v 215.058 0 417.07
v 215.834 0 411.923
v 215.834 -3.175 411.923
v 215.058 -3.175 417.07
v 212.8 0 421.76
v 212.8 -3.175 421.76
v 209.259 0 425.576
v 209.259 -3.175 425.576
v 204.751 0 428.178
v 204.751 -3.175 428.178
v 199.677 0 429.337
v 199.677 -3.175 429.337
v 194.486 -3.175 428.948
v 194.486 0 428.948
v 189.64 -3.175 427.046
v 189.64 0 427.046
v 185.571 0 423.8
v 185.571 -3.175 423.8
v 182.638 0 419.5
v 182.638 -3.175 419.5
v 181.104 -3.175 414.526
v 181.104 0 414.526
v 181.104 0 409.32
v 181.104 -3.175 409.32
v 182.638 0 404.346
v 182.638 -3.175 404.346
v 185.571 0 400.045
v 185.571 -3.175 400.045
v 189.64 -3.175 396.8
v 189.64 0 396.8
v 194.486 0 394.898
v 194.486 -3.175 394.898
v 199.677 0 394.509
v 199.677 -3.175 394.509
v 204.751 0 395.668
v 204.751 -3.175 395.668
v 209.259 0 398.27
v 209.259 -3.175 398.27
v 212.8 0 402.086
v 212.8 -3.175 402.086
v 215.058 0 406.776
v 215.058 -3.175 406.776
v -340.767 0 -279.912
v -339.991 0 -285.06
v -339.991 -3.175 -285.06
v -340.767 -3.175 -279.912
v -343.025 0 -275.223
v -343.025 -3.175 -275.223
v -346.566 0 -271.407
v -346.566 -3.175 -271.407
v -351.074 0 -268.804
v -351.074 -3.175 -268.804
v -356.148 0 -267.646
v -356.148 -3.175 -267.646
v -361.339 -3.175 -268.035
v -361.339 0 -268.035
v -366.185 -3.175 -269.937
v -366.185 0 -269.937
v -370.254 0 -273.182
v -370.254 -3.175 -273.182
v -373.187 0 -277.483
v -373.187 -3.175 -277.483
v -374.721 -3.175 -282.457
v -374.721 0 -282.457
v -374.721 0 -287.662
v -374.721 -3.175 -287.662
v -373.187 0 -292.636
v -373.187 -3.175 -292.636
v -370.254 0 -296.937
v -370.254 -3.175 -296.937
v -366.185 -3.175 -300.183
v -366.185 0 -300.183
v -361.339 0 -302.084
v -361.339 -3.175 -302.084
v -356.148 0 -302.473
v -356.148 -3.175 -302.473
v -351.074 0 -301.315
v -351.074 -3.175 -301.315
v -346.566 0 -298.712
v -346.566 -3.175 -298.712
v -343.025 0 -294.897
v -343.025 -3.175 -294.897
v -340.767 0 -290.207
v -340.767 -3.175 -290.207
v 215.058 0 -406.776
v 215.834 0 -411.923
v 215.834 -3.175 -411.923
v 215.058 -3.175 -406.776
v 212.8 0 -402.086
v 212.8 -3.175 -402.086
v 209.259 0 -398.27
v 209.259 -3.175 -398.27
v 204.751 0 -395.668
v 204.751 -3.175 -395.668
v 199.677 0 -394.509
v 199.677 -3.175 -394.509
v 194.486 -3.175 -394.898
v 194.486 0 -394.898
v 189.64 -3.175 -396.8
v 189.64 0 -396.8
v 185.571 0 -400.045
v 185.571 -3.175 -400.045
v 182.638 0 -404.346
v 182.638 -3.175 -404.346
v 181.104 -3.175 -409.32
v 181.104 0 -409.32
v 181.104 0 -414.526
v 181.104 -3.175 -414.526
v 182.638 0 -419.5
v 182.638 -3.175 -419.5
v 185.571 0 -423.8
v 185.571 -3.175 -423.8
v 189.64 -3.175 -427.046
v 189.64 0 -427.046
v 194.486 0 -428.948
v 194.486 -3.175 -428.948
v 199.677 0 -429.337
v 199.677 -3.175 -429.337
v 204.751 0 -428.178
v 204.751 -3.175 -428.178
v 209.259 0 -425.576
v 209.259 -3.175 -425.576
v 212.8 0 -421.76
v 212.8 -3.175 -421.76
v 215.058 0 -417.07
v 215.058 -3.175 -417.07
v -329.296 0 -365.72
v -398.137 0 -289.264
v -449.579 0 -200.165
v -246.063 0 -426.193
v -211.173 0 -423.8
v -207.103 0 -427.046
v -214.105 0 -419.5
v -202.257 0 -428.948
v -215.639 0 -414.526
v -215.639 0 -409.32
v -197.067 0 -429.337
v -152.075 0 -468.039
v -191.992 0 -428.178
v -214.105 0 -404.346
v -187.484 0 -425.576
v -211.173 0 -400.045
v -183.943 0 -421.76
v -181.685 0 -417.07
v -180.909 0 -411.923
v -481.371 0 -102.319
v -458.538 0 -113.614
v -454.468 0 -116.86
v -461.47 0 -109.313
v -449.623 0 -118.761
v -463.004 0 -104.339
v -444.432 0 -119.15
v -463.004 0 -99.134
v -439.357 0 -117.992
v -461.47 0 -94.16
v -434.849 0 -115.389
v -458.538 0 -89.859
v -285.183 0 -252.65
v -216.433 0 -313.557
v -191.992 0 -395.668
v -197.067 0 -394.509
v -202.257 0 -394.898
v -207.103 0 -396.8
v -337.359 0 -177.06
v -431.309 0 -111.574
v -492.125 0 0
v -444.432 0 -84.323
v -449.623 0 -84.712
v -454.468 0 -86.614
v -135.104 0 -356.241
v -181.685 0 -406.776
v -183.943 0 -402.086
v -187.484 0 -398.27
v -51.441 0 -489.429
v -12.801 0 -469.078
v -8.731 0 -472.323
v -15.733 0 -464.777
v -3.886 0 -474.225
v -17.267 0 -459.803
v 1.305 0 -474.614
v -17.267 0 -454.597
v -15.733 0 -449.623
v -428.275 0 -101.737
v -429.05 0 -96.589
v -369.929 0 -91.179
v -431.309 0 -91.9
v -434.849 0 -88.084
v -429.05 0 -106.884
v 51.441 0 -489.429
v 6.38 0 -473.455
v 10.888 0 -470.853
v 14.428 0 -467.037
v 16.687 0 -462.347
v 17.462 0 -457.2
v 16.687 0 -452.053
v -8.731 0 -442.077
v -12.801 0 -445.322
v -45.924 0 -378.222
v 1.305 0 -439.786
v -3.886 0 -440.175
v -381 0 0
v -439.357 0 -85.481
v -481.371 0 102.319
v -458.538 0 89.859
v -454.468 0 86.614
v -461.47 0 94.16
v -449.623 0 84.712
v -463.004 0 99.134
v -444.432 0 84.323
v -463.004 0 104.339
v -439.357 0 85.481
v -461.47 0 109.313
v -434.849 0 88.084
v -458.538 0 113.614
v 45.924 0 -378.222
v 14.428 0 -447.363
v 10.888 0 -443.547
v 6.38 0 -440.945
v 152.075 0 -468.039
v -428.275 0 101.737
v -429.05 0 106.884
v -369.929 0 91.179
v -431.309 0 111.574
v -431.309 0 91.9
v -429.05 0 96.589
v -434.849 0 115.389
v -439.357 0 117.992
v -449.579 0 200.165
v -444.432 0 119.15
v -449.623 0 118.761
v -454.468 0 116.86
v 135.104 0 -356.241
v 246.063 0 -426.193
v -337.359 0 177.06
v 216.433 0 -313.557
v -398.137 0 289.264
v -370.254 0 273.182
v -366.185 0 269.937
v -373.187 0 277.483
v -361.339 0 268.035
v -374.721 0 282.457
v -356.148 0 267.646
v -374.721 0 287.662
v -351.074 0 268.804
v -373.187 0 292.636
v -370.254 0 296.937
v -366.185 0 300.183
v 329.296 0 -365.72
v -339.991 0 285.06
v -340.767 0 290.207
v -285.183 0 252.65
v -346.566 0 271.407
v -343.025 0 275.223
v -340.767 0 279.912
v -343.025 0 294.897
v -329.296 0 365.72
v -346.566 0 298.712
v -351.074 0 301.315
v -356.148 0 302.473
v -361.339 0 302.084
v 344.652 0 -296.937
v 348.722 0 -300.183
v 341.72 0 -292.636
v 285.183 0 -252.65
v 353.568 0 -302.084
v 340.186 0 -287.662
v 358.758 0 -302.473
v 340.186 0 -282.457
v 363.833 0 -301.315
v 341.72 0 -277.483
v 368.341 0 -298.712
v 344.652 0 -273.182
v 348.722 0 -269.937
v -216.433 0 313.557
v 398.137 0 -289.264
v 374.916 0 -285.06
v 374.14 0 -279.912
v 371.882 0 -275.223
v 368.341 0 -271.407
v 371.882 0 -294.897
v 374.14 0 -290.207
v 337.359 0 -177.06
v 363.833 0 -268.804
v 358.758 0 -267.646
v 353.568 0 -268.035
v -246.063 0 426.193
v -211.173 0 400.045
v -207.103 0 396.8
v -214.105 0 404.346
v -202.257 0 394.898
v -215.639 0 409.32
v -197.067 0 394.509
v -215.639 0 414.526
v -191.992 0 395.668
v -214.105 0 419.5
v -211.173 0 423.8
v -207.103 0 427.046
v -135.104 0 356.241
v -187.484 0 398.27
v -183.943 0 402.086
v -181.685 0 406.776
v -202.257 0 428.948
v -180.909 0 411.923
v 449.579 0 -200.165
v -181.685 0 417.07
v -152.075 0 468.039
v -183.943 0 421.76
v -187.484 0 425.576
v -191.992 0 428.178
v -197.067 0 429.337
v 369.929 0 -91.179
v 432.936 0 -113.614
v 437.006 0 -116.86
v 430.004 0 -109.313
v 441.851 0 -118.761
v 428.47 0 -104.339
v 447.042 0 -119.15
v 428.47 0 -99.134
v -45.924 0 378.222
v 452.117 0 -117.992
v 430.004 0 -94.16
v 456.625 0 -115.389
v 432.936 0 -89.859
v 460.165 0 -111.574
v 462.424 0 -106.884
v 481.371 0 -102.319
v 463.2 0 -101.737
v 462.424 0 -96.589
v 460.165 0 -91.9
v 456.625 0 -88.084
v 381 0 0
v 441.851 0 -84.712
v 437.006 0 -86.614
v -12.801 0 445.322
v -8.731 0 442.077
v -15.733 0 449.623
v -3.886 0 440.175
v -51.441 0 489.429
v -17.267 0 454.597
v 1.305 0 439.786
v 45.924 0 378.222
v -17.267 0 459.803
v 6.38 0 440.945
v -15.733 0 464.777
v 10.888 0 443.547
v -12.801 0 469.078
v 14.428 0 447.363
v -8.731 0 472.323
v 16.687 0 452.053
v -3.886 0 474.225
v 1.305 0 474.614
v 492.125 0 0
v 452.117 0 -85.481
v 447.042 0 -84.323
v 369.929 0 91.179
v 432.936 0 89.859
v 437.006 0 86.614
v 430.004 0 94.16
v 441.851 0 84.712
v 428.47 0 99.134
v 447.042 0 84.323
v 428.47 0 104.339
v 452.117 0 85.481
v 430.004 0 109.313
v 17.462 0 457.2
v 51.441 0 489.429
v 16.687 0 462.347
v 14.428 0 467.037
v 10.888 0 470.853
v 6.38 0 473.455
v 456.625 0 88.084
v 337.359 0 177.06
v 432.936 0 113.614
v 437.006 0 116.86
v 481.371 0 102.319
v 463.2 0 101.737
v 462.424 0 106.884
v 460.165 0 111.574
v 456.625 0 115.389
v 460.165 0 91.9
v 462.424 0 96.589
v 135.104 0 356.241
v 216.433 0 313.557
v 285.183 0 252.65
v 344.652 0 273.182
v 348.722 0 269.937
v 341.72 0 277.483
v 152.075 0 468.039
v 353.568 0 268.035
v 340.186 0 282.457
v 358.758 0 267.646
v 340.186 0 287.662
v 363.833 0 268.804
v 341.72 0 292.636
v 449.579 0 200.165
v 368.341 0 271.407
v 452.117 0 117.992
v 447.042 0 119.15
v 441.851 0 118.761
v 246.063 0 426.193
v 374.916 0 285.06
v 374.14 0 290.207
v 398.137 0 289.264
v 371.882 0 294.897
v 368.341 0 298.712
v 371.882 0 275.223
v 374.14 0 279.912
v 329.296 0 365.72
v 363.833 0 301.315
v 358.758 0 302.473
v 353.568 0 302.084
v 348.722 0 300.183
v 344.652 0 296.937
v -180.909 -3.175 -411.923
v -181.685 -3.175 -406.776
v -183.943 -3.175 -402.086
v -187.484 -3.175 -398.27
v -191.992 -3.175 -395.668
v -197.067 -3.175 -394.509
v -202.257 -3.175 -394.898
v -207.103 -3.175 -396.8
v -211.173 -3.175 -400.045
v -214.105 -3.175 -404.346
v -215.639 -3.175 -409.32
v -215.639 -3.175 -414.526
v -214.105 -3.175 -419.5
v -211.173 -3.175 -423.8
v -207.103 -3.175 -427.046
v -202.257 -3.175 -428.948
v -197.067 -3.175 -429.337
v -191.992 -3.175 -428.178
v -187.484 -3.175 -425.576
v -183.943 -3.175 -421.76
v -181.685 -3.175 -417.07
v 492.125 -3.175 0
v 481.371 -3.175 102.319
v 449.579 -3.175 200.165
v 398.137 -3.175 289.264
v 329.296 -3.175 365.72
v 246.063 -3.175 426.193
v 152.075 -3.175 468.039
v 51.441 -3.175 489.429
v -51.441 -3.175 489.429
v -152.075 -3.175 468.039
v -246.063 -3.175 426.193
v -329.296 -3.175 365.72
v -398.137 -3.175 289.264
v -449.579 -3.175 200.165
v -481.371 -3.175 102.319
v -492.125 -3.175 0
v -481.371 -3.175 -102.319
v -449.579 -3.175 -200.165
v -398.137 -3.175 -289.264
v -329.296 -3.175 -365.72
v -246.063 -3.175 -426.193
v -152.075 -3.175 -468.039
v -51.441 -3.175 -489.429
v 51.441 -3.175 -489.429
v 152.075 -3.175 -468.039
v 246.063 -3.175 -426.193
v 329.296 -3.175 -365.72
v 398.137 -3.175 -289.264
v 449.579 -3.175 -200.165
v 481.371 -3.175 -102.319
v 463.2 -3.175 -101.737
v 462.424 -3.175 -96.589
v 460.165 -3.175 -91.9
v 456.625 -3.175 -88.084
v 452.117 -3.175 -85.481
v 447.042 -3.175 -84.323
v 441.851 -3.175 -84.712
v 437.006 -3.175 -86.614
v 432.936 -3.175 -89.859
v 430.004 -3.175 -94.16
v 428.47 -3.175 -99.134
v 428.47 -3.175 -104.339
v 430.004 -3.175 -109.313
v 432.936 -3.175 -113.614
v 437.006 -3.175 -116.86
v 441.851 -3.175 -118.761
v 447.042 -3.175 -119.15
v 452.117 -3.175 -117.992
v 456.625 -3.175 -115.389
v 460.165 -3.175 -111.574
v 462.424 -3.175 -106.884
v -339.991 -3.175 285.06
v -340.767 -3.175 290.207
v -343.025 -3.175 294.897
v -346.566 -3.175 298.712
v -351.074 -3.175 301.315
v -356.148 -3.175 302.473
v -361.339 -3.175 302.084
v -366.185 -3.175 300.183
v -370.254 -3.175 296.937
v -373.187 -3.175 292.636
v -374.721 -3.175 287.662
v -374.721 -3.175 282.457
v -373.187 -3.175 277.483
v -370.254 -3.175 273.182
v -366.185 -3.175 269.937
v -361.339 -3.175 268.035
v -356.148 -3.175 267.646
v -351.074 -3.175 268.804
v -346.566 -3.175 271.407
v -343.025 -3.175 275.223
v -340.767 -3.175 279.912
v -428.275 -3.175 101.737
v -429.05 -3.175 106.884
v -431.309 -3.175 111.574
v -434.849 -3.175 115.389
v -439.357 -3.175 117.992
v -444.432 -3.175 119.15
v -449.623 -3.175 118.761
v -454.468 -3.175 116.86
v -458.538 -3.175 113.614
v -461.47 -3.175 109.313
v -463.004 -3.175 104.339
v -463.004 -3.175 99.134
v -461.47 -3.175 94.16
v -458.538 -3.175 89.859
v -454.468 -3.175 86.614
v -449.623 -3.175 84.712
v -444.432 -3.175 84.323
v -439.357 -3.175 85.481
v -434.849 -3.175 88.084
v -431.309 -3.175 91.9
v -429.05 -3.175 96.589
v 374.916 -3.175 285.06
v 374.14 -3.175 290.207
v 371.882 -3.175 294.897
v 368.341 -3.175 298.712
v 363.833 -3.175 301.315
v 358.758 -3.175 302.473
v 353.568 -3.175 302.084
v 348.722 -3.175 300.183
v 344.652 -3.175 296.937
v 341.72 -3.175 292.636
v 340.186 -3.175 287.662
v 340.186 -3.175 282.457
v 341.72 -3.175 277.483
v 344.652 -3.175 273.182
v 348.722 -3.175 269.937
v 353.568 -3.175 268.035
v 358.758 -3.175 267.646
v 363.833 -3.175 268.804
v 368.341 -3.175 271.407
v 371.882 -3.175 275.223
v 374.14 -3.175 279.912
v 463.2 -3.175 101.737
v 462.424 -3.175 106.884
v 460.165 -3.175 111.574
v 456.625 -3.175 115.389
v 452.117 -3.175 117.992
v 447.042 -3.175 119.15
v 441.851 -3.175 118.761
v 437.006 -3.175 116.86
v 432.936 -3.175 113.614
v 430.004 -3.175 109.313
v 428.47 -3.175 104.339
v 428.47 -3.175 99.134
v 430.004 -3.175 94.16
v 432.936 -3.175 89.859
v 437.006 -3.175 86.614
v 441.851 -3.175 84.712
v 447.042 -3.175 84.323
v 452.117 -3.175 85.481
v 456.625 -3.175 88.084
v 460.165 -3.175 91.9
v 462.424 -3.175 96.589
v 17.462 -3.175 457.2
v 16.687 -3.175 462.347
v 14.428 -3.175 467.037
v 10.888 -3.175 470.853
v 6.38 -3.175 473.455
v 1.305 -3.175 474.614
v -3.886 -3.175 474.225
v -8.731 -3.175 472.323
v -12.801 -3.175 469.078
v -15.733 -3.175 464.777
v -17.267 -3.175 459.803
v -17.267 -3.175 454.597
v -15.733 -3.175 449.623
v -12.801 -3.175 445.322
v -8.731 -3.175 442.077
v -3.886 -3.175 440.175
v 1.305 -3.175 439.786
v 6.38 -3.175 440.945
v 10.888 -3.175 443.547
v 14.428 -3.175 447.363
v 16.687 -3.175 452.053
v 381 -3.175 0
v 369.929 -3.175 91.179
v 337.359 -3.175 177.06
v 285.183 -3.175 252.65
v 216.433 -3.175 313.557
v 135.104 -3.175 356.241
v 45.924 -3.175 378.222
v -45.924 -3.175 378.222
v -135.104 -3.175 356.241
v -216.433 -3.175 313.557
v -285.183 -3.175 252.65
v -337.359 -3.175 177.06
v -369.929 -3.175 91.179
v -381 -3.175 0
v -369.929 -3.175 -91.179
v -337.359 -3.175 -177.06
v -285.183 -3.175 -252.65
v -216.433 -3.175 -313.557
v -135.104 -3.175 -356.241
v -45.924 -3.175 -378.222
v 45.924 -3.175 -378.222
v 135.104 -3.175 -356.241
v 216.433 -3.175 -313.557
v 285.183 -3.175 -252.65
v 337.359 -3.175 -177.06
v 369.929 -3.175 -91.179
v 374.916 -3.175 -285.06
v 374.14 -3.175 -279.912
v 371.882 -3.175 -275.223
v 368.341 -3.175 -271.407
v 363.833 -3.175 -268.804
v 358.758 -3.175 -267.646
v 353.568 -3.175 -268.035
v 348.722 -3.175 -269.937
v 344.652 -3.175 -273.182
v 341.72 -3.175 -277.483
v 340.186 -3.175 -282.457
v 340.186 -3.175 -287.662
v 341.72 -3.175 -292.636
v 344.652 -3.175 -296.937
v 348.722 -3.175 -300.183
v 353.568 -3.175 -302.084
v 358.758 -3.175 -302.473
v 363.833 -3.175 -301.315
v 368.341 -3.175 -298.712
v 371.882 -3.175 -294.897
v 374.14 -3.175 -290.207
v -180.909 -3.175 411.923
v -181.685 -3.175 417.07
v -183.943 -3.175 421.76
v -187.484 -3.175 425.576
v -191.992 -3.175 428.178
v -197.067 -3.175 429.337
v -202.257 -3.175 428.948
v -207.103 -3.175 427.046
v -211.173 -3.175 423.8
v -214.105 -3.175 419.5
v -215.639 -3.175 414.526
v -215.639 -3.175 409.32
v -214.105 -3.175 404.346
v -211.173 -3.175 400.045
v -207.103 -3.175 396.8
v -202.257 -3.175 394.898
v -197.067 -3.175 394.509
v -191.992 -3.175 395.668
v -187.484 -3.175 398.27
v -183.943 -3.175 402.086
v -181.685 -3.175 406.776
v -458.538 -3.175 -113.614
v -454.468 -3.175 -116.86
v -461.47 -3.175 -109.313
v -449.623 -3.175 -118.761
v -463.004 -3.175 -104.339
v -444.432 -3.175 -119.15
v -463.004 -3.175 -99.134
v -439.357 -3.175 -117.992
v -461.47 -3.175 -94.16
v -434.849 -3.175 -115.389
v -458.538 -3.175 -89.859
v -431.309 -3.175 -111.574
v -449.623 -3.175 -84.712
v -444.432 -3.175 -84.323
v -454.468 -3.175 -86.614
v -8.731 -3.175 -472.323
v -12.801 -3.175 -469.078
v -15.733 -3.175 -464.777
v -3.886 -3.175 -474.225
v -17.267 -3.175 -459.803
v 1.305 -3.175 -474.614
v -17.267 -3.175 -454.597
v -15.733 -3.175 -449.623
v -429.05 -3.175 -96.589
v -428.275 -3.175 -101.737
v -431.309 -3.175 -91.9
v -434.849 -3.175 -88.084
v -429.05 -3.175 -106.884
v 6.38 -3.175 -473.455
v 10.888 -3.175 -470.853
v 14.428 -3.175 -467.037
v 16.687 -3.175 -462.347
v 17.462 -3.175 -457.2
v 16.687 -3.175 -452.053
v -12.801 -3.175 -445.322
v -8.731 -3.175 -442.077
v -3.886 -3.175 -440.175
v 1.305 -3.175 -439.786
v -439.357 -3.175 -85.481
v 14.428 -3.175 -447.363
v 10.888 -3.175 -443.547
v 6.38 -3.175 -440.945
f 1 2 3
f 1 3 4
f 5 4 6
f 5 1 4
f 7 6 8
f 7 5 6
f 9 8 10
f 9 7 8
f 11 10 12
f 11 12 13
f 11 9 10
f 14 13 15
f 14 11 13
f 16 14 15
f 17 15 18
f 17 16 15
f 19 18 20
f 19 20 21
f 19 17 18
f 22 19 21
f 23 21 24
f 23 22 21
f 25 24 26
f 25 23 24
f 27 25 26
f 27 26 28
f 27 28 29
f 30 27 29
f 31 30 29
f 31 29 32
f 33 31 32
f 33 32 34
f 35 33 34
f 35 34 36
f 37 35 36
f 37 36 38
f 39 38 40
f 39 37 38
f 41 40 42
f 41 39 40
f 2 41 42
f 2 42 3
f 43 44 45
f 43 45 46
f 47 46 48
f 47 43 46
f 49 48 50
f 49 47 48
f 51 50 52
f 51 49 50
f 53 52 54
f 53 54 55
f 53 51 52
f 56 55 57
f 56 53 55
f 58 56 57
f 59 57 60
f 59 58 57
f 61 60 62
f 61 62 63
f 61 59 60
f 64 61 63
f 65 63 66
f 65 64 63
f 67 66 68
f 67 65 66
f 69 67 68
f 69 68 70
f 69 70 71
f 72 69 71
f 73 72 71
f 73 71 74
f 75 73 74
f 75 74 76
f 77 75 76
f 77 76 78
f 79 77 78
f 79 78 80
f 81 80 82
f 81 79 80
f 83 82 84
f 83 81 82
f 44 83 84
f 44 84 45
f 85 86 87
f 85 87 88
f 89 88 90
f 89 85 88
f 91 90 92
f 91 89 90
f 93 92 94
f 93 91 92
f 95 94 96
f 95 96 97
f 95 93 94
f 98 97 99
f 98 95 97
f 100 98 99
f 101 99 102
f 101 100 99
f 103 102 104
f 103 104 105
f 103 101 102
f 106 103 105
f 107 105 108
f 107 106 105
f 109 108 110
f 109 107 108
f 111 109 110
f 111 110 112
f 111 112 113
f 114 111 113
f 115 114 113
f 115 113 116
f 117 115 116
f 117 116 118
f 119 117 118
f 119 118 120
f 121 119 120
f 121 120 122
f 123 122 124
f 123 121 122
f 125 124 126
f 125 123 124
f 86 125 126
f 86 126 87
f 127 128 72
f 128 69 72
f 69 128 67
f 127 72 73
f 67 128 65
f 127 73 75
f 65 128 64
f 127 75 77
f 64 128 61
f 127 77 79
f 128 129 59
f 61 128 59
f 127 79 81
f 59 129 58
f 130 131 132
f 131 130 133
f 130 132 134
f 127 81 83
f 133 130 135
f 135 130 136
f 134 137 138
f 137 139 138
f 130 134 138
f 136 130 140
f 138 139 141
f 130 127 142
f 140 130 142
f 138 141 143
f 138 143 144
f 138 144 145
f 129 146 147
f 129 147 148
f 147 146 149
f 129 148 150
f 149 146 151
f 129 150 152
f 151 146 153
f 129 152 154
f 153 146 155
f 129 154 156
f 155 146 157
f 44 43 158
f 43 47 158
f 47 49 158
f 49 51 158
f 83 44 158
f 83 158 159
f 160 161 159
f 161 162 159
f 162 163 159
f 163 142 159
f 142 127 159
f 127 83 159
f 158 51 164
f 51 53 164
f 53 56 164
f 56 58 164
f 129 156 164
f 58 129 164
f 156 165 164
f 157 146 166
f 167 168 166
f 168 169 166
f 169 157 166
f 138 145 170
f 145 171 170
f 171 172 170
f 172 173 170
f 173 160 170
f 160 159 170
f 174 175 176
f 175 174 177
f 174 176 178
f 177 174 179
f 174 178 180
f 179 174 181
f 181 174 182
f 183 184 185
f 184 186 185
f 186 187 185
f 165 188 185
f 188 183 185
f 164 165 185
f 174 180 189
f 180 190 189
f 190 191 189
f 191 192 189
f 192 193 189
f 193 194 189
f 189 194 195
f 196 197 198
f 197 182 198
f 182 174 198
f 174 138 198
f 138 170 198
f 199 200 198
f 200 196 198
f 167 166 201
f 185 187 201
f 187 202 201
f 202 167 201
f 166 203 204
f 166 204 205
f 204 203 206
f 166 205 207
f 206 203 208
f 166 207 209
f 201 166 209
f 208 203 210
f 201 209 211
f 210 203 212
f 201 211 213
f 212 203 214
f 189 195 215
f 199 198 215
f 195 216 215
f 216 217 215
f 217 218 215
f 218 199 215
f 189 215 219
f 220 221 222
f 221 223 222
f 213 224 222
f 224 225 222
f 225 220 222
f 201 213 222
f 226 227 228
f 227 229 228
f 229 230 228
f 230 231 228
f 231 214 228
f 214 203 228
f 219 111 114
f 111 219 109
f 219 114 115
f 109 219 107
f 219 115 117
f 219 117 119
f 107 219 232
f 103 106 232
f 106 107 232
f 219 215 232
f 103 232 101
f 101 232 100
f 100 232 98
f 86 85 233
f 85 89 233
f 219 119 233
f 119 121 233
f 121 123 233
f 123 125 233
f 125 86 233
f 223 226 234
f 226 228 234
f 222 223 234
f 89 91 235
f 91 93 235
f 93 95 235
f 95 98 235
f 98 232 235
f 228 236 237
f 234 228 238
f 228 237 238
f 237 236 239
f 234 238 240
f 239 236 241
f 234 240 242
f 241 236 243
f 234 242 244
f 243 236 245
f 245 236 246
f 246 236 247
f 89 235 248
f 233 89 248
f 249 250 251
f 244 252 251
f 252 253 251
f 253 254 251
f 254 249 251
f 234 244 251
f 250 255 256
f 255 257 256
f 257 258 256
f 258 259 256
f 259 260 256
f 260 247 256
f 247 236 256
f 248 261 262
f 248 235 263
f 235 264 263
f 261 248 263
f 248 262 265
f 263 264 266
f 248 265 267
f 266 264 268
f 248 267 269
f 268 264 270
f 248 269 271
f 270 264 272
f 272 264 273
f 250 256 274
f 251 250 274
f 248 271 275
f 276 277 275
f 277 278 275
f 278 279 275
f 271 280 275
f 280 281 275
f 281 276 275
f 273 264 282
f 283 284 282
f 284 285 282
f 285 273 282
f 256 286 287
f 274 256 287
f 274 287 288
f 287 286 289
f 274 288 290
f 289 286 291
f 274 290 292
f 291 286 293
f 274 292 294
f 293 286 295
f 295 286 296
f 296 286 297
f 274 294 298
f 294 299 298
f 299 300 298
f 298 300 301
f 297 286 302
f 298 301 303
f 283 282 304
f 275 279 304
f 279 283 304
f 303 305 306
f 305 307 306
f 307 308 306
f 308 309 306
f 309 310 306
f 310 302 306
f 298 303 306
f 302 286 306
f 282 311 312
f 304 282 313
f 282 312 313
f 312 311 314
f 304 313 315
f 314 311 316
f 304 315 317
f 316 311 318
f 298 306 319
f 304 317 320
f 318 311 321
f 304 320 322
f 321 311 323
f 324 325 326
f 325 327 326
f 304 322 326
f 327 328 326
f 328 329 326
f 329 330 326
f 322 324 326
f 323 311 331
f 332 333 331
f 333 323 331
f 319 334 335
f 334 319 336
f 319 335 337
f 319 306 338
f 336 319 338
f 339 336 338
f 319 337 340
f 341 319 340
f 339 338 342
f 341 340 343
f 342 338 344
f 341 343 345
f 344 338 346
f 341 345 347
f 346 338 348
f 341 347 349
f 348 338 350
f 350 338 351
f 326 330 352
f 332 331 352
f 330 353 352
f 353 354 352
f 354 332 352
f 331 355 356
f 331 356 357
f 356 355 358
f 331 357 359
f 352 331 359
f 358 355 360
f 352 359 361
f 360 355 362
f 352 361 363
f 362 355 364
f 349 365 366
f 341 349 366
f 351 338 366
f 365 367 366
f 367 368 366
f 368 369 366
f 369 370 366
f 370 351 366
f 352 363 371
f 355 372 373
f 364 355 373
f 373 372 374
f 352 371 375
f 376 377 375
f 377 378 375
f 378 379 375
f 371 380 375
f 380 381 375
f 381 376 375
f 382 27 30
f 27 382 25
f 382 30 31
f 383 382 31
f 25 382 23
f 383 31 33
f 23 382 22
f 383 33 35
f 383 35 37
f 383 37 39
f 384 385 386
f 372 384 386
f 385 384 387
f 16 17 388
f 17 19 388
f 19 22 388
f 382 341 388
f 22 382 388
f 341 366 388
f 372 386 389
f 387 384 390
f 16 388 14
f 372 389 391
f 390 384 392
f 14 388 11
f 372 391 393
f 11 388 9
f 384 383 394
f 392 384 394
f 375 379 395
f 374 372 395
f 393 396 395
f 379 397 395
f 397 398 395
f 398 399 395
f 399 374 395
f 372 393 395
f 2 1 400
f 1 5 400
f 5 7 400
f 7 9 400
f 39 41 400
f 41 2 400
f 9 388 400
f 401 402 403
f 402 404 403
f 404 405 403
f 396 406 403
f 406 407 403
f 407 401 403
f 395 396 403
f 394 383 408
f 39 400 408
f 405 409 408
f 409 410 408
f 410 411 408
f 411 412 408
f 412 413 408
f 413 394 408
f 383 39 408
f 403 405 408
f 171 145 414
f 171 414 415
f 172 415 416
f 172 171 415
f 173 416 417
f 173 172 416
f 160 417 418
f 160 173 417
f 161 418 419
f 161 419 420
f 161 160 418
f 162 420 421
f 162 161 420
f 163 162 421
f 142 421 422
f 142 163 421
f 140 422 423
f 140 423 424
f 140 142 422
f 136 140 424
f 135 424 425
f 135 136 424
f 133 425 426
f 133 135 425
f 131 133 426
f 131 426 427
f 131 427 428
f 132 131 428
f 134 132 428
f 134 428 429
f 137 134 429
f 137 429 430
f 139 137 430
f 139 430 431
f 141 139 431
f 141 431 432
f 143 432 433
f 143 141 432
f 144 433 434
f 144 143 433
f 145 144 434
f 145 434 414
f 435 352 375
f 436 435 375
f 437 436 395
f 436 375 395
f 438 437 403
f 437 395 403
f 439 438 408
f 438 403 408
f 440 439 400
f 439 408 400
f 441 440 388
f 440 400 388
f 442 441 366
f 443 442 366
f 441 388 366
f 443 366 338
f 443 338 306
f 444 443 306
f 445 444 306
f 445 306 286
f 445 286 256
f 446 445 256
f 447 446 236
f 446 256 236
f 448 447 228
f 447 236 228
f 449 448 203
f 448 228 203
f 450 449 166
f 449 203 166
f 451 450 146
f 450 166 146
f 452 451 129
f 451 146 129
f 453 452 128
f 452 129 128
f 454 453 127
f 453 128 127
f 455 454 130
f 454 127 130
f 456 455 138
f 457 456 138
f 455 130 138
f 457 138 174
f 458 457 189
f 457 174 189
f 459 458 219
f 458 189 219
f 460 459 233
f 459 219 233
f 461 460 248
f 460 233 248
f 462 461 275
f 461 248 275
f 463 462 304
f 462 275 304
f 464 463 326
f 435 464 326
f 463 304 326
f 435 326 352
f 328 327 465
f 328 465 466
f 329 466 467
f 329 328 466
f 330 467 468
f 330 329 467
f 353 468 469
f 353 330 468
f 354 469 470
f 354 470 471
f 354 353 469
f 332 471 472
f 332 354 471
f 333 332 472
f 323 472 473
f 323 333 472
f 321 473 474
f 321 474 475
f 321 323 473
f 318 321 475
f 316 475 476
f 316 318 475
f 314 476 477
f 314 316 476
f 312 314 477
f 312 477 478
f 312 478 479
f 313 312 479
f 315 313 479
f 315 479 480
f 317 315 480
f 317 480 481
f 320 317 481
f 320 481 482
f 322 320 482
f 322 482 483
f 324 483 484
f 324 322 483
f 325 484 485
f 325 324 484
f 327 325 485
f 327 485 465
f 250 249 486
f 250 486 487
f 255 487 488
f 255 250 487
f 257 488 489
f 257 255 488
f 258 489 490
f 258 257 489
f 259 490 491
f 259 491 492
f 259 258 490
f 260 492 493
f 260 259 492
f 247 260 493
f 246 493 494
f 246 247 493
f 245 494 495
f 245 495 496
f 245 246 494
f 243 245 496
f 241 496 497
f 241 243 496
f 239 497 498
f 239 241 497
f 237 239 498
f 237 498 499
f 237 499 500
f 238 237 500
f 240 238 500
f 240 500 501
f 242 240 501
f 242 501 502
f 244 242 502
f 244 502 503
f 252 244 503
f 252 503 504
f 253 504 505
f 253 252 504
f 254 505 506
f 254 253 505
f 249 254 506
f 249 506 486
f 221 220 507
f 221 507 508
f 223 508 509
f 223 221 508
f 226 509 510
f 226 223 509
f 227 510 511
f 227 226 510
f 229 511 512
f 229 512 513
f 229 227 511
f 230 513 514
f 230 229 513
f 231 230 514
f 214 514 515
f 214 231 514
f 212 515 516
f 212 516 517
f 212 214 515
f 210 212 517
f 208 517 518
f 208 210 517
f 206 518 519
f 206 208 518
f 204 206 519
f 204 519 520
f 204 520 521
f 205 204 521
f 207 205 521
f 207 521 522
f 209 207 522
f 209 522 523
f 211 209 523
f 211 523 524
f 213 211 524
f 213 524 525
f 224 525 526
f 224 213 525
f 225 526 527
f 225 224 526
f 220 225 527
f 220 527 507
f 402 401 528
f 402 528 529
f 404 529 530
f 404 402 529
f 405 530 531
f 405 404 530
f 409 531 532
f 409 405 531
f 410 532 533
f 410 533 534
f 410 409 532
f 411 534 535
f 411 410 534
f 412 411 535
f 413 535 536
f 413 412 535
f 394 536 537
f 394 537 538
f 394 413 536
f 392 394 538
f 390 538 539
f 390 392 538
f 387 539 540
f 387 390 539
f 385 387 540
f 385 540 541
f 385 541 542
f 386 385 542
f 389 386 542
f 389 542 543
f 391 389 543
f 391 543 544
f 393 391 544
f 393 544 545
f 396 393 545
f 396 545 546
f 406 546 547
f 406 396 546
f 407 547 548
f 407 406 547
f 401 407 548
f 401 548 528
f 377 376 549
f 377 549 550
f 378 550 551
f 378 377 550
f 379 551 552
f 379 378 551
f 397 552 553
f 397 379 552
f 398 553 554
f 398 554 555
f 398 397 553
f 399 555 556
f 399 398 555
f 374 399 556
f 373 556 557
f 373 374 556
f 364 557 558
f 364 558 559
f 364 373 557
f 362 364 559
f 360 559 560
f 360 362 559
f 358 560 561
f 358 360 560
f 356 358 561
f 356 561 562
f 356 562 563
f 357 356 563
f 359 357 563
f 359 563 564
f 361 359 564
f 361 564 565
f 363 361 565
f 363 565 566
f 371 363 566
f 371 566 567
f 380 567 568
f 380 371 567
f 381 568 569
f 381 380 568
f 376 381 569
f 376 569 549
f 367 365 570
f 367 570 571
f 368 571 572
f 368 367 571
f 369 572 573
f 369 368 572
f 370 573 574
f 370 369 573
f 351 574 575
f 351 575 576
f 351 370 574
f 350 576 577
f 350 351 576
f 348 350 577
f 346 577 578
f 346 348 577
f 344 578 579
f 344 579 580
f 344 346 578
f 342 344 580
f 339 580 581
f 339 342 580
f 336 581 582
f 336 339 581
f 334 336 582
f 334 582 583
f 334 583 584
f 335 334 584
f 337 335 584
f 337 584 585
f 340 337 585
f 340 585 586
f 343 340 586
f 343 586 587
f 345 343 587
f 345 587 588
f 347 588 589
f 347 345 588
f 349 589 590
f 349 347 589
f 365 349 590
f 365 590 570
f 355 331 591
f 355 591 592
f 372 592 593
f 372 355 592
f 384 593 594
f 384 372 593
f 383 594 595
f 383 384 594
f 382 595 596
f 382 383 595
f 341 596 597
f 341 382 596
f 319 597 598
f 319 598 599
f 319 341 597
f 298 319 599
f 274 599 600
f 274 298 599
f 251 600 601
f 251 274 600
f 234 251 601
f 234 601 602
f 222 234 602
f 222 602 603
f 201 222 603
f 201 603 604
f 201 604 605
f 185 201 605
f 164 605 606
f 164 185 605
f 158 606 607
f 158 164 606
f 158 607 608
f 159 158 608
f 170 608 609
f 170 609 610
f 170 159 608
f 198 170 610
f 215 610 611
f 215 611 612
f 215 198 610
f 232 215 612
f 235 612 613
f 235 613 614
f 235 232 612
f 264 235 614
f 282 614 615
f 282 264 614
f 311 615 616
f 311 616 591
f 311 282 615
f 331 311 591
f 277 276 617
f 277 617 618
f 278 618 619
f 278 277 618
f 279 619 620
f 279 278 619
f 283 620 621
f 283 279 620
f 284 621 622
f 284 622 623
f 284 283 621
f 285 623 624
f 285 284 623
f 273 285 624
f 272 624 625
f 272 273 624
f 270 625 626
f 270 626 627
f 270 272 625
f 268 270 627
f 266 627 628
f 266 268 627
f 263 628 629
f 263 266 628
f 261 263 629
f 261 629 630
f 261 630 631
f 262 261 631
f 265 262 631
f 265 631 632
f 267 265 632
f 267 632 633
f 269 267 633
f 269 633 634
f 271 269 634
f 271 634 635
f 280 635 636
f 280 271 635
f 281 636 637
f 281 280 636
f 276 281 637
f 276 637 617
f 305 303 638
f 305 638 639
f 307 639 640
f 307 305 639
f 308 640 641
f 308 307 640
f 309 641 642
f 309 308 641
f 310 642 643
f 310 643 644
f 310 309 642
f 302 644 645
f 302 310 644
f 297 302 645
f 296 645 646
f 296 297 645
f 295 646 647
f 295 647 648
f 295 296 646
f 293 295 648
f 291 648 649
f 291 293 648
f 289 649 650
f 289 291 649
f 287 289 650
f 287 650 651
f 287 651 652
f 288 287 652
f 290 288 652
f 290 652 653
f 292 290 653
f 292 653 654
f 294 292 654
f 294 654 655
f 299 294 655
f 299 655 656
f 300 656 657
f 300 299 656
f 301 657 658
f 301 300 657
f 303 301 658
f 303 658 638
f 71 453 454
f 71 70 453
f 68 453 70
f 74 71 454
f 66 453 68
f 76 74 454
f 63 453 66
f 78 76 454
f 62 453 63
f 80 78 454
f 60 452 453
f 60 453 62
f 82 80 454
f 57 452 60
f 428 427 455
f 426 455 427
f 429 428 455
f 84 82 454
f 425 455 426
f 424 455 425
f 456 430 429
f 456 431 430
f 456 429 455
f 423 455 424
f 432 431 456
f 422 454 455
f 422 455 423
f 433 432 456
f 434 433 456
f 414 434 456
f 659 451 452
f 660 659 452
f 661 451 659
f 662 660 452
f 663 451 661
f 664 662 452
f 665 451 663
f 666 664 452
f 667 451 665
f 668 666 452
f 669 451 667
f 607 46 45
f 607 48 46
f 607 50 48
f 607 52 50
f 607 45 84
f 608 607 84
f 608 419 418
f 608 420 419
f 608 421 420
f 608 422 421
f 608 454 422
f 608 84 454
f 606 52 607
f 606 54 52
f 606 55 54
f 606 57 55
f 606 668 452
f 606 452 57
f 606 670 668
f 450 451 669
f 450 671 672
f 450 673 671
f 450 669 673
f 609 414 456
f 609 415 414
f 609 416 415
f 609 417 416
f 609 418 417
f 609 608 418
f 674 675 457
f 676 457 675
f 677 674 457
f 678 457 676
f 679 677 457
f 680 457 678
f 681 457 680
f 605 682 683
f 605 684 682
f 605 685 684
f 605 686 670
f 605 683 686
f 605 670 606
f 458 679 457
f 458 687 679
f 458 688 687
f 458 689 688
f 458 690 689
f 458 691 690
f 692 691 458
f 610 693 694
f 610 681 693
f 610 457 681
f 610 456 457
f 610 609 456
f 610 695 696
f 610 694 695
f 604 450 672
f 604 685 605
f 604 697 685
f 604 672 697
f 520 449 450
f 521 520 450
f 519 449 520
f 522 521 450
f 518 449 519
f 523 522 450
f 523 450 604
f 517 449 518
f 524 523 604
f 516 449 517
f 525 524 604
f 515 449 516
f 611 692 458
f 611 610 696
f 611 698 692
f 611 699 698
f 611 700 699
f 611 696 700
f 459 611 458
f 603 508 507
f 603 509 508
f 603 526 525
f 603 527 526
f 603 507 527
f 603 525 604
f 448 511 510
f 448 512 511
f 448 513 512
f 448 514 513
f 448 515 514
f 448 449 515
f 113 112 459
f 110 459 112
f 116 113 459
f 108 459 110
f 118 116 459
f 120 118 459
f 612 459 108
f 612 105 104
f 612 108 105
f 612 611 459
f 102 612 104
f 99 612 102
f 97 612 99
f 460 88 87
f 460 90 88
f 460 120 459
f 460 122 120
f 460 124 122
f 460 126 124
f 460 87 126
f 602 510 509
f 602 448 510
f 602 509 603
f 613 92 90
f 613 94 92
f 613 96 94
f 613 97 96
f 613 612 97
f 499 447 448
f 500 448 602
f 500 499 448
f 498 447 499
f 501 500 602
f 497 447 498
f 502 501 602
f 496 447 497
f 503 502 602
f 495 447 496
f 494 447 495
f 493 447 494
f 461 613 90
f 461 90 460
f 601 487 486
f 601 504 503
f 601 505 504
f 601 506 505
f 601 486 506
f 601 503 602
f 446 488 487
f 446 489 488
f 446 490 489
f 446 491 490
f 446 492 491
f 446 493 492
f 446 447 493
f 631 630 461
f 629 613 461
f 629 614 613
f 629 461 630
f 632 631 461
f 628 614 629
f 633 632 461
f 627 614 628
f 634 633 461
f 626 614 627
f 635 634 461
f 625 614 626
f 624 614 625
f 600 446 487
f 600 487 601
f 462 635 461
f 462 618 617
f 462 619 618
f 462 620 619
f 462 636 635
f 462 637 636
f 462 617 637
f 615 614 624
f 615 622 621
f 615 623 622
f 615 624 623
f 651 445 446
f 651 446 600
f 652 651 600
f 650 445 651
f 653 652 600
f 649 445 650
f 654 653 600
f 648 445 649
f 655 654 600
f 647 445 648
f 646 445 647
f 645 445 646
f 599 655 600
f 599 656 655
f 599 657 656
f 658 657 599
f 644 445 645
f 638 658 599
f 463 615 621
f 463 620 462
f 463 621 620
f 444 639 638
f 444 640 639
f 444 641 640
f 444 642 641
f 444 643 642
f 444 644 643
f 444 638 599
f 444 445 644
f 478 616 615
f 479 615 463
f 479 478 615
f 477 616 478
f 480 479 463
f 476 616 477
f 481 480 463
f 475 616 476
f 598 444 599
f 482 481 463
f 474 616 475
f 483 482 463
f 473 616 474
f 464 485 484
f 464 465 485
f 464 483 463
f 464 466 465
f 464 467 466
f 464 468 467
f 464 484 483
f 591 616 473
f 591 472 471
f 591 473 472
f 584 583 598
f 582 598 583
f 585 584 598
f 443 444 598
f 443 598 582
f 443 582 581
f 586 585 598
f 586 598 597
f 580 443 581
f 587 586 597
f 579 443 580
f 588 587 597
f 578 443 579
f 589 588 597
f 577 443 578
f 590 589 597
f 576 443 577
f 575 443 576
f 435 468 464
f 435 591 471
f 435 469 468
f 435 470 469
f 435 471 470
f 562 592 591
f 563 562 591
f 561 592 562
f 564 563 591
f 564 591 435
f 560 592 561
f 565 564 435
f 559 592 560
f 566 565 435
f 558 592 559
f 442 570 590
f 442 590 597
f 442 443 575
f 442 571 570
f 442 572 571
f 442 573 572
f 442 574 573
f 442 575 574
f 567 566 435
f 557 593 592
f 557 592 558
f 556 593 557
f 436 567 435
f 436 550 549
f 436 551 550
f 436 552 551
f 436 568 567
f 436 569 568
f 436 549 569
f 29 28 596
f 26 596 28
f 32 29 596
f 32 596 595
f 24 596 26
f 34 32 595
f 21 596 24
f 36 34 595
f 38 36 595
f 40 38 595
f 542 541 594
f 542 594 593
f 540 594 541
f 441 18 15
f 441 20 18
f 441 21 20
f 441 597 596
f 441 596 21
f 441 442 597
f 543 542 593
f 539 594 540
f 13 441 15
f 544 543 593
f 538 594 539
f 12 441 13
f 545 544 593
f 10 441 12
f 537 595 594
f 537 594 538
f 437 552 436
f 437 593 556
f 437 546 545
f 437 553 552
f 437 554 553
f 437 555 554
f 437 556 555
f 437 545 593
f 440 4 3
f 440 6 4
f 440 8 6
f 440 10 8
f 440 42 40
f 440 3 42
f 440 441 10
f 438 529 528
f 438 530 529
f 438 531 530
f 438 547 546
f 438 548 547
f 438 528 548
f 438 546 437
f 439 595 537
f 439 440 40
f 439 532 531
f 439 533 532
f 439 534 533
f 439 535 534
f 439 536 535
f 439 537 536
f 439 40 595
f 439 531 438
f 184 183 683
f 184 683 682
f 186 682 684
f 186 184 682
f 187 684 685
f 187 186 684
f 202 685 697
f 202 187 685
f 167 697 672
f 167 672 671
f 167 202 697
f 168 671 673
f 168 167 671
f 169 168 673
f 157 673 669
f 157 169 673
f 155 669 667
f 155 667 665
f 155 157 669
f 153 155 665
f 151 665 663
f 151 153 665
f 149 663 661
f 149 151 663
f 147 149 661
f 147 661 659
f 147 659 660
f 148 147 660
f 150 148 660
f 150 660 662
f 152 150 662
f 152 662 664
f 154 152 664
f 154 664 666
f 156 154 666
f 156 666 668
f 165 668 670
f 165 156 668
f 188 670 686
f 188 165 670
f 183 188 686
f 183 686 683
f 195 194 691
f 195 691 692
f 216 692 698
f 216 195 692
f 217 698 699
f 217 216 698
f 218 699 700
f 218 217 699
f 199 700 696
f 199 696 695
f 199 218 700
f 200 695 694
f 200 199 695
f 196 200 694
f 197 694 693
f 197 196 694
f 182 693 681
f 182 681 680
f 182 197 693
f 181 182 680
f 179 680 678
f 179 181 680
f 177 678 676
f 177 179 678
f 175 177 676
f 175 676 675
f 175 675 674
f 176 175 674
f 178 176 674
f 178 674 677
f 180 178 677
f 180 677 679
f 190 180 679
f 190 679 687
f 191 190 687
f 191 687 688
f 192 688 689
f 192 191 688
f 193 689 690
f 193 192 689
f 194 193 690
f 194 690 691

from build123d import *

# Parameters (mm, degrees)
F0_R     = 492.125
F0_R_2   = 17.4625
F0_R_3   = 381
F1_DEPTH = 3.175


with BuildPart() as f1:
    # F0 (on Front) → F1 (new body)
    with BuildSketch(Plane.XZ):
        Circle(F0_R)
        with Locations((-357.453354, -285.059537)):
            Circle(F0_R_2, mode=Mode.SUBTRACT)
        with Locations((-198.371646, -411.922966)):
            Circle(F0_R_2, mode=Mode.SUBTRACT)
        with Locations((0, -457.2)):
            Circle(F0_R_2, mode=Mode.SUBTRACT)
        with Locations((-445.737041, -101.736571)):
            Circle(F0_R_2, mode=Mode.SUBTRACT)
        Circle(F0_R_3, mode=Mode.SUBTRACT)
        with Locations((198.371646, -411.922966)):
            Circle(F0_R_2, mode=Mode.SUBTRACT)
        with Locations((357.453354, -285.059537)):
            Circle(F0_R_2, mode=Mode.SUBTRACT)
        with Locations((445.737041, -101.736571)):
            Circle(F0_R_2, mode=Mode.SUBTRACT)
        with Locations((-445.737041, 101.736571)):
            Circle(F0_R_2, mode=Mode.SUBTRACT)
        with Locations((-357.453354, 285.059537)):
            Circle(F0_R_2, mode=Mode.SUBTRACT)
        with Locations((-198.371646, 411.922966)):
            Circle(F0_R_2, mode=Mode.SUBTRACT)
        with Locations((0, 457.2)):
            Circle(F0_R_2, mode=Mode.SUBTRACT)
        with Locations((445.737041, 101.736571)):
            Circle(F0_R_2, mode=Mode.SUBTRACT)
        with Locations((198.371646, 411.922966)):
            Circle(F0_R_2, mode=Mode.SUBTRACT)
        with Locations((357.453354, 285.059537)):
            Circle(F0_R_2, mode=Mode.SUBTRACT)
    extrude(amount=F1_DEPTH)


solid = f1.part
